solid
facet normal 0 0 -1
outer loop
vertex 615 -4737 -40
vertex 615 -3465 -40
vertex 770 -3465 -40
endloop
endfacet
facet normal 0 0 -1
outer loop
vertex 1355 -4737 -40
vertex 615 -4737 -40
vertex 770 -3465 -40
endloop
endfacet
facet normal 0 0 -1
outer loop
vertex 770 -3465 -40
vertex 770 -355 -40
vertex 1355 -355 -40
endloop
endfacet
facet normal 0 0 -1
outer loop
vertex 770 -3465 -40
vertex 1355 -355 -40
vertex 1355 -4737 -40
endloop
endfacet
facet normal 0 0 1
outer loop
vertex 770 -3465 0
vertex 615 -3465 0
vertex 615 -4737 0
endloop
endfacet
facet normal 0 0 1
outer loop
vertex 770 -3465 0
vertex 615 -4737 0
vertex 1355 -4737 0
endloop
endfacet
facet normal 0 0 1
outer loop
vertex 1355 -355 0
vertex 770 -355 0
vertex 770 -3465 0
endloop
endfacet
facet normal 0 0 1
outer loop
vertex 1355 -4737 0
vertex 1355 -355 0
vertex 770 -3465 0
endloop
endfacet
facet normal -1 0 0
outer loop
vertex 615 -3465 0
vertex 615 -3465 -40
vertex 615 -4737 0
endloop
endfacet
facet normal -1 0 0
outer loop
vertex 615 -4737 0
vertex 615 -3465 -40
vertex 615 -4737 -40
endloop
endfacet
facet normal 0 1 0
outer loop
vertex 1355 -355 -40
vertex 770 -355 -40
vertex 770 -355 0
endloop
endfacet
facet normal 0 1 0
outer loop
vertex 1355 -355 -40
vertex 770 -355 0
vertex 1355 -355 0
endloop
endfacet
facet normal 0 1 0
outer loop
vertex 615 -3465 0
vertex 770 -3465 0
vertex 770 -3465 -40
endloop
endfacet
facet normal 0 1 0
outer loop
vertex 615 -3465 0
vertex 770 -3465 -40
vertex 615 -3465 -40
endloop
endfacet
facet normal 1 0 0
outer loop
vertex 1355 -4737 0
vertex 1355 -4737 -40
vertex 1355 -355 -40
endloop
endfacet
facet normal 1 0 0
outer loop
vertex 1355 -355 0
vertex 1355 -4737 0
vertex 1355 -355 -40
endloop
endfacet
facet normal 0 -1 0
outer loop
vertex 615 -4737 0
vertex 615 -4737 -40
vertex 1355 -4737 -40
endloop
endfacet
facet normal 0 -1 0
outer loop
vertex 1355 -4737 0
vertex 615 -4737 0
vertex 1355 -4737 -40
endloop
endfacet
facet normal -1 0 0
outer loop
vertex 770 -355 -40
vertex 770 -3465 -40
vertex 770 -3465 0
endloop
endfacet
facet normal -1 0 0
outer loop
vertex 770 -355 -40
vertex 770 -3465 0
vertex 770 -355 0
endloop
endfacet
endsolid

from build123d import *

# Parameters (mm, degrees)
TABAN_FLAN_1_DEPTH         = 40
KES_EKSTR_ZYON1_DEPTH      = 6158.209189235
KES_EKSTR_ZYON1_DEPTH_BACK = 6158.209189235
IZIM2_W                    = 1360
IZIM2_H                    = 355
KES_EKSTR_ZYON2_DEPTH      = 6158.209189235
KES_EKSTR_ZYON2_DEPTH_BACK = 6158.209189235
IZIM3_W                    = 365
IZIM3_H                    = 3110
IZIM3_W_2                  = 5
IZIM3_H_2                  = 5650
KES_EKSTR_ZYON3_DEPTH      = 6157.106724221
KES_EKSTR_ZYON3_DEPTH_BACK = 6157.106724221
IZIM4_W                    = 405
IZIM4_H                    = 3110
KES_EKSTR_ZYON4_DEPTH      = 6157.106724221
KES_EKSTR_ZYON4_DEPTH_BACK = 6157.106724221


# Sheet-metal steps are written as plain solids
with BuildPart() as part:
    # Çizim1 → Taban-Flanş1 (new body)
    with BuildSketch(Plane.XY):
        Polygon((0, 0), (0, -3465), (-660, -3465), (-660, -6005), (1360, -6005), (1360, 0), align=None)
    extrude(amount=-TABAN_FLAN_1_DEPTH)

    # Çizim2 → Kes-Ekstrüzyon1 (cut, two sides: drawn at the far end of the back side and taken through both)
    with BuildSketch(Plane.XY.offset(-KES_EKSTR_ZYON1_DEPTH_BACK)):
        with Locations((680, -177.5)):
            Rectangle(IZIM2_W, IZIM2_H)
    extrude(amount=KES_EKSTR_ZYON1_DEPTH + KES_EKSTR_ZYON1_DEPTH_BACK, mode=Mode.SUBTRACT)

    # Çizim3 → Kes-Ekstrüzyon2 (cut, two sides: drawn at the far end of the back side and taken through both)
    with BuildSketch(Plane.XY.offset(-KES_EKSTR_ZYON2_DEPTH_BACK)):
        with Locations((182.5, -1910)):
            Rectangle(IZIM3_W, IZIM3_H)
        with Locations((1357.5, -3180)):
            Rectangle(IZIM3_W_2, IZIM3_H_2)
    extrude(amount=KES_EKSTR_ZYON2_DEPTH + KES_EKSTR_ZYON2_DEPTH_BACK, mode=Mode.SUBTRACT)

    # Çizim4 → Kes-Ekstrüzyon3 (cut, two sides: drawn at the far end of the back side and taken through both)
    with BuildSketch(Plane.XY.offset(-KES_EKSTR_ZYON3_DEPTH_BACK)):
        with Locations((567.5, -1910)):
            Rectangle(IZIM4_W, IZIM4_H)
    extrude(amount=KES_EKSTR_ZYON3_DEPTH + KES_EKSTR_ZYON3_DEPTH_BACK, mode=Mode.SUBTRACT)

    # Çizim5 → Kes-Ekstrüzyon4 (cut, two sides: drawn at the far end of the back side and taken through both)
    with BuildSketch(Plane.XY.offset(-KES_EKSTR_ZYON4_DEPTH_BACK)):
        Polygon((615, -3465), (615, -4737), (1355, -4737), (1355, -6005), (-660, -6005), (-660, -3465), align=None)
    extrude(amount=KES_EKSTR_ZYON4_DEPTH + KES_EKSTR_ZYON4_DEPTH_BACK, mode=Mode.SUBTRACT)


solid = part.part
